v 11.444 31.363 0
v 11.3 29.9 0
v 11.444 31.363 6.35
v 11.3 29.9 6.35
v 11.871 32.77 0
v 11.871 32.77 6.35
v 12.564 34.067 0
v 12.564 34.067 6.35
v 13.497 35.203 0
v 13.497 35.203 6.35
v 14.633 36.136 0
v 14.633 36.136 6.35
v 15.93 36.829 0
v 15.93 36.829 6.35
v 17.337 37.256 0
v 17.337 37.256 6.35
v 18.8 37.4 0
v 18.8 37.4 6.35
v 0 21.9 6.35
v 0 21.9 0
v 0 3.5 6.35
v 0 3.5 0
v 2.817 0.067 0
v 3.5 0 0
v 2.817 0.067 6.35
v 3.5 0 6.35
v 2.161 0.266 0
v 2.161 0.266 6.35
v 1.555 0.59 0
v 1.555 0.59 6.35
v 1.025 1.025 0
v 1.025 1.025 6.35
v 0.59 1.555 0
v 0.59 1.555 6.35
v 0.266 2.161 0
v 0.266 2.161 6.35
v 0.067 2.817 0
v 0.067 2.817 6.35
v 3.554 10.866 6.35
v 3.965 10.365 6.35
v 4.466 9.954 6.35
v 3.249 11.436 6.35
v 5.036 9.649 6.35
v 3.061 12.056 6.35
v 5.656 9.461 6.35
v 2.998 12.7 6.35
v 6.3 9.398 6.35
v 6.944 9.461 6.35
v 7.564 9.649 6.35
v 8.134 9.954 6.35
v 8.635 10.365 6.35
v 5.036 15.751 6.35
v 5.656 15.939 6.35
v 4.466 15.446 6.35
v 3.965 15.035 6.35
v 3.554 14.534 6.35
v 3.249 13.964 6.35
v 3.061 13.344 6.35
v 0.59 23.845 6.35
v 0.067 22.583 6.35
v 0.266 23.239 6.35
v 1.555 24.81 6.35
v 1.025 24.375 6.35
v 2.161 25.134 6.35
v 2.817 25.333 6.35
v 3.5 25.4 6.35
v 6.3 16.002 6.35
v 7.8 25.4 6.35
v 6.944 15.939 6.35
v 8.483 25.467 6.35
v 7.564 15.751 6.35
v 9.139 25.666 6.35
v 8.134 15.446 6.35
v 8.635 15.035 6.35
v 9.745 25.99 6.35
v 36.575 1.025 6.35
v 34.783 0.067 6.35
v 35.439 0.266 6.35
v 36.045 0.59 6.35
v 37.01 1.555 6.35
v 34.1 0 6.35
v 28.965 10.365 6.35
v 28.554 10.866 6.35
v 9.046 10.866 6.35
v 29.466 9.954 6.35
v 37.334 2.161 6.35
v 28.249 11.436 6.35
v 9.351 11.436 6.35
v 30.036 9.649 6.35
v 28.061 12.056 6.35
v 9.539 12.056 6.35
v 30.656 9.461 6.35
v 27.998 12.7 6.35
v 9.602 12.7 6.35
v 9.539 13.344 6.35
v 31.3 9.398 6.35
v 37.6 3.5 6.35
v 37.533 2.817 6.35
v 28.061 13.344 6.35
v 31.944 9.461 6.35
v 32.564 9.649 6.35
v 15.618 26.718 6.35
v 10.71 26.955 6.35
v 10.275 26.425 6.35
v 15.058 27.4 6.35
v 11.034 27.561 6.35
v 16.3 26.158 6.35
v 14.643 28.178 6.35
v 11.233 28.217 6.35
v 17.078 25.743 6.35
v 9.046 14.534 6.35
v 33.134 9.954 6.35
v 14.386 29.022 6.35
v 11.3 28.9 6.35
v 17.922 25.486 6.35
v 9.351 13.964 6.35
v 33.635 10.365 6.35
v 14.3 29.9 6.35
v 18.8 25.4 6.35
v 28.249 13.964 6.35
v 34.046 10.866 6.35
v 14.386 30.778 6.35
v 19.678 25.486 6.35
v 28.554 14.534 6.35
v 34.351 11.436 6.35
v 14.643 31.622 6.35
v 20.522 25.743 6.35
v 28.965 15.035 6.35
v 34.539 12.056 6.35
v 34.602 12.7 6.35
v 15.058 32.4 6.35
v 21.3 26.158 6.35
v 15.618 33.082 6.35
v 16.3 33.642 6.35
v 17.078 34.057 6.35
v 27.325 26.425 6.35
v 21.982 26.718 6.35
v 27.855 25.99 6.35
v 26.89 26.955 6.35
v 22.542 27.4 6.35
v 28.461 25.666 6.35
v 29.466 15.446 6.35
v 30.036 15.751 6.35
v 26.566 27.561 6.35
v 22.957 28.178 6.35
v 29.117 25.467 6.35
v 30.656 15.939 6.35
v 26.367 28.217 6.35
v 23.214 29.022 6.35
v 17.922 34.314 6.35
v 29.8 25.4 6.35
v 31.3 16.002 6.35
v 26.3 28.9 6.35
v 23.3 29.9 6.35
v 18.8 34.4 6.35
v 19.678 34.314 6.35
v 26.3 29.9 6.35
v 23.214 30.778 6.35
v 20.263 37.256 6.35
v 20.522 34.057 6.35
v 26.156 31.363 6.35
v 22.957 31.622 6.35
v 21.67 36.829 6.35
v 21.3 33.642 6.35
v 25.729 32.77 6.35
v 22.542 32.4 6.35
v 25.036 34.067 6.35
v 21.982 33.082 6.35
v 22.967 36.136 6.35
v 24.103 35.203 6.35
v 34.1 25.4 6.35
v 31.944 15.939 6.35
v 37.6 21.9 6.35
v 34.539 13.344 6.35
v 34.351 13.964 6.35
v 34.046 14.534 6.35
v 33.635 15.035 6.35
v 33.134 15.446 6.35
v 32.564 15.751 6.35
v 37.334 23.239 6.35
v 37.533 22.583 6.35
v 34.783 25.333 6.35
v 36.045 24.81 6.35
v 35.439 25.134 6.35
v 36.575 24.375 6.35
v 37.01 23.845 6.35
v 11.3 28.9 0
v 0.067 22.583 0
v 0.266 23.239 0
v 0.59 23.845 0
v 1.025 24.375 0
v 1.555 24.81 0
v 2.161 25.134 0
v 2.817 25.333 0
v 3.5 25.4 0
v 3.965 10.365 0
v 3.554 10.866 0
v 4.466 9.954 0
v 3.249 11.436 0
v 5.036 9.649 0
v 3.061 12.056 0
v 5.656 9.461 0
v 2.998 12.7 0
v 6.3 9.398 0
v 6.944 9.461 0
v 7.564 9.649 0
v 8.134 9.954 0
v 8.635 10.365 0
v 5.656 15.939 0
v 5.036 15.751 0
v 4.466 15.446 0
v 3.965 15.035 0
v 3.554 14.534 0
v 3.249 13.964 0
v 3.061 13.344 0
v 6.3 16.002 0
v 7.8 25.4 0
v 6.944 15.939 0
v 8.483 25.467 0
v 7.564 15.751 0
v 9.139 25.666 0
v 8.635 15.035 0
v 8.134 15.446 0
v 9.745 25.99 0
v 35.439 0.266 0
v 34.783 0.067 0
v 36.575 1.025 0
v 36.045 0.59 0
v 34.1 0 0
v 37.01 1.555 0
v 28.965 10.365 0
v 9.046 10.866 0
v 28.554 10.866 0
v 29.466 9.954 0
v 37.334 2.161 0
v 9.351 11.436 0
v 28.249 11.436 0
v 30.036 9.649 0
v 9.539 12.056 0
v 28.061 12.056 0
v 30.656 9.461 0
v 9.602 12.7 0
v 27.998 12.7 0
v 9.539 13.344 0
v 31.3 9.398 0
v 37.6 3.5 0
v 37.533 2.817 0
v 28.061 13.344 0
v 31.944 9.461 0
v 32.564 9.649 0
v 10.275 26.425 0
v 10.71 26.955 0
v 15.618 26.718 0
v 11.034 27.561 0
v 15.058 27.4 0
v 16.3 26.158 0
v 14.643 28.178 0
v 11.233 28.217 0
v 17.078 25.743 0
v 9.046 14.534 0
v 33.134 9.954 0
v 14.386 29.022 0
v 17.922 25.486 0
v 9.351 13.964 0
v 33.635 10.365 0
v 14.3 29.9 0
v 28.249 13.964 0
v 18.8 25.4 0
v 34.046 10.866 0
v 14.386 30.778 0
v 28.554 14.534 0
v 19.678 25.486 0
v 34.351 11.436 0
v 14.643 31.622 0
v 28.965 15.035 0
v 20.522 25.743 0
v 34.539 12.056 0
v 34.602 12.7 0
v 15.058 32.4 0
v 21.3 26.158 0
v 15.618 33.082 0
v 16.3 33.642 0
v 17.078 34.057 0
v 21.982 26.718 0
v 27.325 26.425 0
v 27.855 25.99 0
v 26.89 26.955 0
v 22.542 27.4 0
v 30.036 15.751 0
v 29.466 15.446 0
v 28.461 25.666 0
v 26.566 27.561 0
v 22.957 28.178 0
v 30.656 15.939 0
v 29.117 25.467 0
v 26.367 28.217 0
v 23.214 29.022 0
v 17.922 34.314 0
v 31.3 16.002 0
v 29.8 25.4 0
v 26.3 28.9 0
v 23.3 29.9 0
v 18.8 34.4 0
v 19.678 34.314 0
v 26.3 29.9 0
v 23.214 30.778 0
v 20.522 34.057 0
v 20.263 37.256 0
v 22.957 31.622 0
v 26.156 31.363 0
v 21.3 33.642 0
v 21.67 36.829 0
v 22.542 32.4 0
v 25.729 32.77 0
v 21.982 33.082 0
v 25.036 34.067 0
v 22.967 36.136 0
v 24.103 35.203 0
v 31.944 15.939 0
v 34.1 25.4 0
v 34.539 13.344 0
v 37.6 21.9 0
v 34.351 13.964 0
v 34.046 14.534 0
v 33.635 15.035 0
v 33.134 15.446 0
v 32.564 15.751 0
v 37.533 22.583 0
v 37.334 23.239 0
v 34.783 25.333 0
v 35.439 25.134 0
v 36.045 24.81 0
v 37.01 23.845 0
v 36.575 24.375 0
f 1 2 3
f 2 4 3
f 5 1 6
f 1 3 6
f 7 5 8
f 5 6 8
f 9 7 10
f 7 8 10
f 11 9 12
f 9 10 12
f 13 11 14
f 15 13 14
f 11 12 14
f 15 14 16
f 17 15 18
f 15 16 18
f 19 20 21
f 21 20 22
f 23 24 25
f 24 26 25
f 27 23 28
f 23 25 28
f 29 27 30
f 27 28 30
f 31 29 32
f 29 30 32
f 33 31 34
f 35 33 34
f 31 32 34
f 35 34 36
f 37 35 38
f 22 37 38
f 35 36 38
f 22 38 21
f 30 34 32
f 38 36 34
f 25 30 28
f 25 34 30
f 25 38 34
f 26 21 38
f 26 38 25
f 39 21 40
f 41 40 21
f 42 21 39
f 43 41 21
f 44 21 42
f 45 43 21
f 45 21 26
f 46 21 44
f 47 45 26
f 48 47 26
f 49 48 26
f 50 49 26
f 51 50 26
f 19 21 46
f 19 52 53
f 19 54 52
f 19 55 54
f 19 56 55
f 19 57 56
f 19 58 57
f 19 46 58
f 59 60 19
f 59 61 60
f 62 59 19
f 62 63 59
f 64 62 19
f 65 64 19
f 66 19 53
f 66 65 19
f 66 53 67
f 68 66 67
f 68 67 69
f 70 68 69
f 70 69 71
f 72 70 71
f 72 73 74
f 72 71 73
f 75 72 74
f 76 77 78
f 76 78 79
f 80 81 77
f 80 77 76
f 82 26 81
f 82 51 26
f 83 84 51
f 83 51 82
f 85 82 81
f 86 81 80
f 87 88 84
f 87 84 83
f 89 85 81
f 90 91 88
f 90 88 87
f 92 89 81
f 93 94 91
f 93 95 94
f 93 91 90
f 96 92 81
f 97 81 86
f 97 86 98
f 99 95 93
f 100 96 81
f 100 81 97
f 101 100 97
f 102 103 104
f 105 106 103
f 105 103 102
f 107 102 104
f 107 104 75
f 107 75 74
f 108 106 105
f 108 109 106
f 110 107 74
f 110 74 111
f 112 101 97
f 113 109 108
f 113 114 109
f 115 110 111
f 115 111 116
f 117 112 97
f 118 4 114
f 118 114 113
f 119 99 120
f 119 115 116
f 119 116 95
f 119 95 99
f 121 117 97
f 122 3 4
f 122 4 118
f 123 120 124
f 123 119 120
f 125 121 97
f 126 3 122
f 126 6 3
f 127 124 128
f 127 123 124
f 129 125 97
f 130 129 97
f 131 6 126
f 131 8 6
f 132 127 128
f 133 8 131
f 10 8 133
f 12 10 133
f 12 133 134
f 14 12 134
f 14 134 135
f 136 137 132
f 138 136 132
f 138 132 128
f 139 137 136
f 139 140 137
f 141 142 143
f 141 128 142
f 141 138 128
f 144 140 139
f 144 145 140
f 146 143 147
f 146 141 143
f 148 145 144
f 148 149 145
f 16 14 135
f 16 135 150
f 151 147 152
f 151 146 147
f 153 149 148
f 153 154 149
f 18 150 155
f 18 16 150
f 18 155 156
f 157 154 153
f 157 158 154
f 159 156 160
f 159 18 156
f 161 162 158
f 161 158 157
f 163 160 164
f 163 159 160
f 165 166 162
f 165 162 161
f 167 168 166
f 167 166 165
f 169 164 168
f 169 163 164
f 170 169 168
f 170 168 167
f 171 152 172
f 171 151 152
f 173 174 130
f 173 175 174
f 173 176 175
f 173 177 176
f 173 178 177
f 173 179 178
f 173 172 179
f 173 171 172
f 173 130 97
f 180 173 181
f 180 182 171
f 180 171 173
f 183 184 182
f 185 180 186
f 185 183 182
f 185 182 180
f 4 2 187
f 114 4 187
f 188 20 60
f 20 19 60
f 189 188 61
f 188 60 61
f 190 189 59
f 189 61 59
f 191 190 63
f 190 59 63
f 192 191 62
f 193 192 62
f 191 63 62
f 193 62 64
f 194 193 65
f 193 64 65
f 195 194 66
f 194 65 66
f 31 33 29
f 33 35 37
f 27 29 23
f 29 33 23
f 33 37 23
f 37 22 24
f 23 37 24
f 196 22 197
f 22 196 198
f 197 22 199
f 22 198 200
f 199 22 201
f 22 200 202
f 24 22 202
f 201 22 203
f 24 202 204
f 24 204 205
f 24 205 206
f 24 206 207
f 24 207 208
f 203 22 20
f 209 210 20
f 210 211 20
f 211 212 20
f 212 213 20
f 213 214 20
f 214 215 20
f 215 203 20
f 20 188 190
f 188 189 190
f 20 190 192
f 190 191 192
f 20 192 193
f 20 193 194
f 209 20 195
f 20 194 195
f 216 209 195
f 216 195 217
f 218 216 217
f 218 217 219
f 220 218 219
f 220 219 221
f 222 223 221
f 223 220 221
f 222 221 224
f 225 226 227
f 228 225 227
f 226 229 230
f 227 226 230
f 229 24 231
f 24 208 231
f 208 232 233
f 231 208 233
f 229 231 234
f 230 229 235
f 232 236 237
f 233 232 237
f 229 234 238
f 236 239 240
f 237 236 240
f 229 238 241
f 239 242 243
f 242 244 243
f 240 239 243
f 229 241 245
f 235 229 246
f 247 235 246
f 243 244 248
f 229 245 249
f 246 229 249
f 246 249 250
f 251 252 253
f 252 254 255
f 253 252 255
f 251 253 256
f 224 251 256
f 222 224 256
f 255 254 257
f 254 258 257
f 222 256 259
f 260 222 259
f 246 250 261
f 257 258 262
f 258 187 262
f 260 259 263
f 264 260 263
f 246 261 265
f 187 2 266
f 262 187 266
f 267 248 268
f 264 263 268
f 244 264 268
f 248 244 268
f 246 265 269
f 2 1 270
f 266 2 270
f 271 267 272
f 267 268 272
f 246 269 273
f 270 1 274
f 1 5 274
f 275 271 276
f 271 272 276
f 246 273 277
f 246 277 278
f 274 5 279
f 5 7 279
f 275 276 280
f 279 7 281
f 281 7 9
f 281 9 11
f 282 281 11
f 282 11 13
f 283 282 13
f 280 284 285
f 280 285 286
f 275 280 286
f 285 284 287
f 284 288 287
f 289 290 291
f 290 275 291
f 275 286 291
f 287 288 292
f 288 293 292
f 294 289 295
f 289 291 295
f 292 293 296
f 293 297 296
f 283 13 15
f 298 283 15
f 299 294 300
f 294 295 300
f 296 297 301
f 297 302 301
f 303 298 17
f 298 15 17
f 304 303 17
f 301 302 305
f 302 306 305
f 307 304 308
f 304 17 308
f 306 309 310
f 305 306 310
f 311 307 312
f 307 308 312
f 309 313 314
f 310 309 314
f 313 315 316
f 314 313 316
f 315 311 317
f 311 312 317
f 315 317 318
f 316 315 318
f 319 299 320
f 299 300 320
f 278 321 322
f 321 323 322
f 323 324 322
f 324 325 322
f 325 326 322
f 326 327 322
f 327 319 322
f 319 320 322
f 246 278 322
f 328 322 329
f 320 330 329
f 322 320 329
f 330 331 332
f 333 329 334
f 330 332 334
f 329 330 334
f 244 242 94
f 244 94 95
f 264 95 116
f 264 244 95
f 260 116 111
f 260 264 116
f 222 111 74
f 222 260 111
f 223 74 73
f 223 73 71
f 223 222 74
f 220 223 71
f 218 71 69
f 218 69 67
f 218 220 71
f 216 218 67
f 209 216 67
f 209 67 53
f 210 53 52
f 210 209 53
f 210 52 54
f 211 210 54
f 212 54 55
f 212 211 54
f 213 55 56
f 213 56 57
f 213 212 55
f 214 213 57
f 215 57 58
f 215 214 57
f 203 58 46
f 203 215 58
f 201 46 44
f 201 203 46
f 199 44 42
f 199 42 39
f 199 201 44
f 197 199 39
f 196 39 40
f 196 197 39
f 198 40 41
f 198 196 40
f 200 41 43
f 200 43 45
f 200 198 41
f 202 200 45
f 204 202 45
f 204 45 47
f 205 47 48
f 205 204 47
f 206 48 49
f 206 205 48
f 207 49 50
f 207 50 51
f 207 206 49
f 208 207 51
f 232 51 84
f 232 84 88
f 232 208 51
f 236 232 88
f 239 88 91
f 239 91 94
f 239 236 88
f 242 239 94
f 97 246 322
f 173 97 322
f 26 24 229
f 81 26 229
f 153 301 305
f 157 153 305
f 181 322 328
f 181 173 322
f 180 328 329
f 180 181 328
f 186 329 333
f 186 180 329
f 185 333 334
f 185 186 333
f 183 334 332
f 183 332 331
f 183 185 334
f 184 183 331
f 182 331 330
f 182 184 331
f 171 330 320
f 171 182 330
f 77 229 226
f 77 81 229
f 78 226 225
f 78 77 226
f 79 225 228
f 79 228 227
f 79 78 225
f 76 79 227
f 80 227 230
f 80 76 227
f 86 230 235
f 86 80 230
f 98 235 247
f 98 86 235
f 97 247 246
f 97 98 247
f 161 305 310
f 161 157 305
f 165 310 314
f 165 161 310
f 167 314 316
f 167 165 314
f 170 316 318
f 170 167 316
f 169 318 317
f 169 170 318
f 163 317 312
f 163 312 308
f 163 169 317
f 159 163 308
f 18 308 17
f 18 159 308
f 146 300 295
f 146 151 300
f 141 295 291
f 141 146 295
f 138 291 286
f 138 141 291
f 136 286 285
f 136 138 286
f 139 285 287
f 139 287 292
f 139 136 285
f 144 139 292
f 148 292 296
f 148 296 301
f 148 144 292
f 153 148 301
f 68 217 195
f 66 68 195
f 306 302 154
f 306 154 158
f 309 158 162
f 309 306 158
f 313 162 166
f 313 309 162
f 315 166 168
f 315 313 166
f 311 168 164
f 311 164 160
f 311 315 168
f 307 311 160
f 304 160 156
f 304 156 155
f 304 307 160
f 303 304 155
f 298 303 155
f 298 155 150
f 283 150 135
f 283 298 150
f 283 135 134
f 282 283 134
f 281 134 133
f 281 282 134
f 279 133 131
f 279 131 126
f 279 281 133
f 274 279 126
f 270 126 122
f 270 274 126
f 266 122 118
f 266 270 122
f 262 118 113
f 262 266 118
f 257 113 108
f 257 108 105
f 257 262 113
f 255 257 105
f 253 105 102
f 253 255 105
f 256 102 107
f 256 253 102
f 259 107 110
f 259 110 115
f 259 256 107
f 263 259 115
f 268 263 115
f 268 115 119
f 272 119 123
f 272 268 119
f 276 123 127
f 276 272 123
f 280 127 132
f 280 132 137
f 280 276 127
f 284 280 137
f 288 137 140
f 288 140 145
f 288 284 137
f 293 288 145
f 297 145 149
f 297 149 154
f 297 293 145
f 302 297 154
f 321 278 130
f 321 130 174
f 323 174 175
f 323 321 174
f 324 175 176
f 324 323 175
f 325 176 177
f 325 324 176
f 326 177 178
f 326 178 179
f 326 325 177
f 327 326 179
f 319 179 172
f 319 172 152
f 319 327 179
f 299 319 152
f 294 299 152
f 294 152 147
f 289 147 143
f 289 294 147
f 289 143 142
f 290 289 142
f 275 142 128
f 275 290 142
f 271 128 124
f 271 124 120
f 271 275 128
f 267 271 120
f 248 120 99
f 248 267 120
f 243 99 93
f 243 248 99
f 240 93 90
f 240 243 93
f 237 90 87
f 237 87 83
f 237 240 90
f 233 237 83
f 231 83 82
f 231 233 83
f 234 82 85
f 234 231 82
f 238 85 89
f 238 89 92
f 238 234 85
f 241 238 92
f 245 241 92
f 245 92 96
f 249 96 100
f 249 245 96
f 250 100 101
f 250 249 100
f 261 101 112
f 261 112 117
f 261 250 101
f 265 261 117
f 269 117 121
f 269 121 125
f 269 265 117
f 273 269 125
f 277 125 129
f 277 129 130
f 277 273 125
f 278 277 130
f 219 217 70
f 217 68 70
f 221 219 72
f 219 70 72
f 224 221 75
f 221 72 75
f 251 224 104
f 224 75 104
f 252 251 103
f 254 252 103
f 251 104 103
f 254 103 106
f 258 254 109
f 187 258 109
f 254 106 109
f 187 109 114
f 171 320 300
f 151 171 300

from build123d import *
from OCP.BRepFilletAPI import BRepFilletAPI_MakeFillet

# Parameters (mm, degrees)
SKETCH1_R           = 4.5
SKETCH1_R_2         = 3.302
BOSS_EXTRUDE1_DEPTH = 6.35
FILLET2_R           = 7.5
FILLET2_R_2         = 3.5


with BuildPart() as part:
    # Sketch1 → Boss-Extrude1 (new body)
    with BuildSketch(Plane.XY):
        Polygon((0, 0), (37.6, 0), (37.6, 25.4), (26.3, 25.4), (26.3, 37.4), (11.3, 37.4), (11.3, 25.4), (0, 25.4), align=None)
        with Locations((18.8, 29.9)):
            Circle(SKETCH1_R, mode=Mode.SUBTRACT)
        with Locations((6.3, 12.7)):
            Circle(SKETCH1_R_2, mode=Mode.SUBTRACT)
        with Locations((31.3, 12.7)):
            Circle(SKETCH1_R_2, mode=Mode.SUBTRACT)
    extrude(amount=BOSS_EXTRUDE1_DEPTH)

    # Fillet2
    fillet2_edges_1 = [part.edges().sort_by_distance(p)[0] for p in [
        (11.3, 37.4, 3.175),
        (26.3, 37.4, 3.175),
    ]]
    fillet2_edges_2 = [part.edges().sort_by_distance(p)[0] for p in [
        (11.3, 25.4, 3.175),
        (0, 25.4, 3.175),
        (0, 0, 3.175),
        (37.6, 25.4, 3.175),
        (26.3, 25.4, 3.175),
        (37.6, 0, 3.175),
    ]]
    fillet2 = BRepFilletAPI_MakeFillet(part.part.solid().wrapped)
    for e in fillet2_edges_1:
        fillet2.Add(FILLET2_R - 0.0001, e.wrapped)
    for e in fillet2_edges_2:
        fillet2.Add(FILLET2_R_2 - 0.0001, e.wrapped)
    add(Compound.cast(fillet2.Shape()), mode=Mode.REPLACE)  # a hair under: the kernel refuses the full size


solid = part.part
